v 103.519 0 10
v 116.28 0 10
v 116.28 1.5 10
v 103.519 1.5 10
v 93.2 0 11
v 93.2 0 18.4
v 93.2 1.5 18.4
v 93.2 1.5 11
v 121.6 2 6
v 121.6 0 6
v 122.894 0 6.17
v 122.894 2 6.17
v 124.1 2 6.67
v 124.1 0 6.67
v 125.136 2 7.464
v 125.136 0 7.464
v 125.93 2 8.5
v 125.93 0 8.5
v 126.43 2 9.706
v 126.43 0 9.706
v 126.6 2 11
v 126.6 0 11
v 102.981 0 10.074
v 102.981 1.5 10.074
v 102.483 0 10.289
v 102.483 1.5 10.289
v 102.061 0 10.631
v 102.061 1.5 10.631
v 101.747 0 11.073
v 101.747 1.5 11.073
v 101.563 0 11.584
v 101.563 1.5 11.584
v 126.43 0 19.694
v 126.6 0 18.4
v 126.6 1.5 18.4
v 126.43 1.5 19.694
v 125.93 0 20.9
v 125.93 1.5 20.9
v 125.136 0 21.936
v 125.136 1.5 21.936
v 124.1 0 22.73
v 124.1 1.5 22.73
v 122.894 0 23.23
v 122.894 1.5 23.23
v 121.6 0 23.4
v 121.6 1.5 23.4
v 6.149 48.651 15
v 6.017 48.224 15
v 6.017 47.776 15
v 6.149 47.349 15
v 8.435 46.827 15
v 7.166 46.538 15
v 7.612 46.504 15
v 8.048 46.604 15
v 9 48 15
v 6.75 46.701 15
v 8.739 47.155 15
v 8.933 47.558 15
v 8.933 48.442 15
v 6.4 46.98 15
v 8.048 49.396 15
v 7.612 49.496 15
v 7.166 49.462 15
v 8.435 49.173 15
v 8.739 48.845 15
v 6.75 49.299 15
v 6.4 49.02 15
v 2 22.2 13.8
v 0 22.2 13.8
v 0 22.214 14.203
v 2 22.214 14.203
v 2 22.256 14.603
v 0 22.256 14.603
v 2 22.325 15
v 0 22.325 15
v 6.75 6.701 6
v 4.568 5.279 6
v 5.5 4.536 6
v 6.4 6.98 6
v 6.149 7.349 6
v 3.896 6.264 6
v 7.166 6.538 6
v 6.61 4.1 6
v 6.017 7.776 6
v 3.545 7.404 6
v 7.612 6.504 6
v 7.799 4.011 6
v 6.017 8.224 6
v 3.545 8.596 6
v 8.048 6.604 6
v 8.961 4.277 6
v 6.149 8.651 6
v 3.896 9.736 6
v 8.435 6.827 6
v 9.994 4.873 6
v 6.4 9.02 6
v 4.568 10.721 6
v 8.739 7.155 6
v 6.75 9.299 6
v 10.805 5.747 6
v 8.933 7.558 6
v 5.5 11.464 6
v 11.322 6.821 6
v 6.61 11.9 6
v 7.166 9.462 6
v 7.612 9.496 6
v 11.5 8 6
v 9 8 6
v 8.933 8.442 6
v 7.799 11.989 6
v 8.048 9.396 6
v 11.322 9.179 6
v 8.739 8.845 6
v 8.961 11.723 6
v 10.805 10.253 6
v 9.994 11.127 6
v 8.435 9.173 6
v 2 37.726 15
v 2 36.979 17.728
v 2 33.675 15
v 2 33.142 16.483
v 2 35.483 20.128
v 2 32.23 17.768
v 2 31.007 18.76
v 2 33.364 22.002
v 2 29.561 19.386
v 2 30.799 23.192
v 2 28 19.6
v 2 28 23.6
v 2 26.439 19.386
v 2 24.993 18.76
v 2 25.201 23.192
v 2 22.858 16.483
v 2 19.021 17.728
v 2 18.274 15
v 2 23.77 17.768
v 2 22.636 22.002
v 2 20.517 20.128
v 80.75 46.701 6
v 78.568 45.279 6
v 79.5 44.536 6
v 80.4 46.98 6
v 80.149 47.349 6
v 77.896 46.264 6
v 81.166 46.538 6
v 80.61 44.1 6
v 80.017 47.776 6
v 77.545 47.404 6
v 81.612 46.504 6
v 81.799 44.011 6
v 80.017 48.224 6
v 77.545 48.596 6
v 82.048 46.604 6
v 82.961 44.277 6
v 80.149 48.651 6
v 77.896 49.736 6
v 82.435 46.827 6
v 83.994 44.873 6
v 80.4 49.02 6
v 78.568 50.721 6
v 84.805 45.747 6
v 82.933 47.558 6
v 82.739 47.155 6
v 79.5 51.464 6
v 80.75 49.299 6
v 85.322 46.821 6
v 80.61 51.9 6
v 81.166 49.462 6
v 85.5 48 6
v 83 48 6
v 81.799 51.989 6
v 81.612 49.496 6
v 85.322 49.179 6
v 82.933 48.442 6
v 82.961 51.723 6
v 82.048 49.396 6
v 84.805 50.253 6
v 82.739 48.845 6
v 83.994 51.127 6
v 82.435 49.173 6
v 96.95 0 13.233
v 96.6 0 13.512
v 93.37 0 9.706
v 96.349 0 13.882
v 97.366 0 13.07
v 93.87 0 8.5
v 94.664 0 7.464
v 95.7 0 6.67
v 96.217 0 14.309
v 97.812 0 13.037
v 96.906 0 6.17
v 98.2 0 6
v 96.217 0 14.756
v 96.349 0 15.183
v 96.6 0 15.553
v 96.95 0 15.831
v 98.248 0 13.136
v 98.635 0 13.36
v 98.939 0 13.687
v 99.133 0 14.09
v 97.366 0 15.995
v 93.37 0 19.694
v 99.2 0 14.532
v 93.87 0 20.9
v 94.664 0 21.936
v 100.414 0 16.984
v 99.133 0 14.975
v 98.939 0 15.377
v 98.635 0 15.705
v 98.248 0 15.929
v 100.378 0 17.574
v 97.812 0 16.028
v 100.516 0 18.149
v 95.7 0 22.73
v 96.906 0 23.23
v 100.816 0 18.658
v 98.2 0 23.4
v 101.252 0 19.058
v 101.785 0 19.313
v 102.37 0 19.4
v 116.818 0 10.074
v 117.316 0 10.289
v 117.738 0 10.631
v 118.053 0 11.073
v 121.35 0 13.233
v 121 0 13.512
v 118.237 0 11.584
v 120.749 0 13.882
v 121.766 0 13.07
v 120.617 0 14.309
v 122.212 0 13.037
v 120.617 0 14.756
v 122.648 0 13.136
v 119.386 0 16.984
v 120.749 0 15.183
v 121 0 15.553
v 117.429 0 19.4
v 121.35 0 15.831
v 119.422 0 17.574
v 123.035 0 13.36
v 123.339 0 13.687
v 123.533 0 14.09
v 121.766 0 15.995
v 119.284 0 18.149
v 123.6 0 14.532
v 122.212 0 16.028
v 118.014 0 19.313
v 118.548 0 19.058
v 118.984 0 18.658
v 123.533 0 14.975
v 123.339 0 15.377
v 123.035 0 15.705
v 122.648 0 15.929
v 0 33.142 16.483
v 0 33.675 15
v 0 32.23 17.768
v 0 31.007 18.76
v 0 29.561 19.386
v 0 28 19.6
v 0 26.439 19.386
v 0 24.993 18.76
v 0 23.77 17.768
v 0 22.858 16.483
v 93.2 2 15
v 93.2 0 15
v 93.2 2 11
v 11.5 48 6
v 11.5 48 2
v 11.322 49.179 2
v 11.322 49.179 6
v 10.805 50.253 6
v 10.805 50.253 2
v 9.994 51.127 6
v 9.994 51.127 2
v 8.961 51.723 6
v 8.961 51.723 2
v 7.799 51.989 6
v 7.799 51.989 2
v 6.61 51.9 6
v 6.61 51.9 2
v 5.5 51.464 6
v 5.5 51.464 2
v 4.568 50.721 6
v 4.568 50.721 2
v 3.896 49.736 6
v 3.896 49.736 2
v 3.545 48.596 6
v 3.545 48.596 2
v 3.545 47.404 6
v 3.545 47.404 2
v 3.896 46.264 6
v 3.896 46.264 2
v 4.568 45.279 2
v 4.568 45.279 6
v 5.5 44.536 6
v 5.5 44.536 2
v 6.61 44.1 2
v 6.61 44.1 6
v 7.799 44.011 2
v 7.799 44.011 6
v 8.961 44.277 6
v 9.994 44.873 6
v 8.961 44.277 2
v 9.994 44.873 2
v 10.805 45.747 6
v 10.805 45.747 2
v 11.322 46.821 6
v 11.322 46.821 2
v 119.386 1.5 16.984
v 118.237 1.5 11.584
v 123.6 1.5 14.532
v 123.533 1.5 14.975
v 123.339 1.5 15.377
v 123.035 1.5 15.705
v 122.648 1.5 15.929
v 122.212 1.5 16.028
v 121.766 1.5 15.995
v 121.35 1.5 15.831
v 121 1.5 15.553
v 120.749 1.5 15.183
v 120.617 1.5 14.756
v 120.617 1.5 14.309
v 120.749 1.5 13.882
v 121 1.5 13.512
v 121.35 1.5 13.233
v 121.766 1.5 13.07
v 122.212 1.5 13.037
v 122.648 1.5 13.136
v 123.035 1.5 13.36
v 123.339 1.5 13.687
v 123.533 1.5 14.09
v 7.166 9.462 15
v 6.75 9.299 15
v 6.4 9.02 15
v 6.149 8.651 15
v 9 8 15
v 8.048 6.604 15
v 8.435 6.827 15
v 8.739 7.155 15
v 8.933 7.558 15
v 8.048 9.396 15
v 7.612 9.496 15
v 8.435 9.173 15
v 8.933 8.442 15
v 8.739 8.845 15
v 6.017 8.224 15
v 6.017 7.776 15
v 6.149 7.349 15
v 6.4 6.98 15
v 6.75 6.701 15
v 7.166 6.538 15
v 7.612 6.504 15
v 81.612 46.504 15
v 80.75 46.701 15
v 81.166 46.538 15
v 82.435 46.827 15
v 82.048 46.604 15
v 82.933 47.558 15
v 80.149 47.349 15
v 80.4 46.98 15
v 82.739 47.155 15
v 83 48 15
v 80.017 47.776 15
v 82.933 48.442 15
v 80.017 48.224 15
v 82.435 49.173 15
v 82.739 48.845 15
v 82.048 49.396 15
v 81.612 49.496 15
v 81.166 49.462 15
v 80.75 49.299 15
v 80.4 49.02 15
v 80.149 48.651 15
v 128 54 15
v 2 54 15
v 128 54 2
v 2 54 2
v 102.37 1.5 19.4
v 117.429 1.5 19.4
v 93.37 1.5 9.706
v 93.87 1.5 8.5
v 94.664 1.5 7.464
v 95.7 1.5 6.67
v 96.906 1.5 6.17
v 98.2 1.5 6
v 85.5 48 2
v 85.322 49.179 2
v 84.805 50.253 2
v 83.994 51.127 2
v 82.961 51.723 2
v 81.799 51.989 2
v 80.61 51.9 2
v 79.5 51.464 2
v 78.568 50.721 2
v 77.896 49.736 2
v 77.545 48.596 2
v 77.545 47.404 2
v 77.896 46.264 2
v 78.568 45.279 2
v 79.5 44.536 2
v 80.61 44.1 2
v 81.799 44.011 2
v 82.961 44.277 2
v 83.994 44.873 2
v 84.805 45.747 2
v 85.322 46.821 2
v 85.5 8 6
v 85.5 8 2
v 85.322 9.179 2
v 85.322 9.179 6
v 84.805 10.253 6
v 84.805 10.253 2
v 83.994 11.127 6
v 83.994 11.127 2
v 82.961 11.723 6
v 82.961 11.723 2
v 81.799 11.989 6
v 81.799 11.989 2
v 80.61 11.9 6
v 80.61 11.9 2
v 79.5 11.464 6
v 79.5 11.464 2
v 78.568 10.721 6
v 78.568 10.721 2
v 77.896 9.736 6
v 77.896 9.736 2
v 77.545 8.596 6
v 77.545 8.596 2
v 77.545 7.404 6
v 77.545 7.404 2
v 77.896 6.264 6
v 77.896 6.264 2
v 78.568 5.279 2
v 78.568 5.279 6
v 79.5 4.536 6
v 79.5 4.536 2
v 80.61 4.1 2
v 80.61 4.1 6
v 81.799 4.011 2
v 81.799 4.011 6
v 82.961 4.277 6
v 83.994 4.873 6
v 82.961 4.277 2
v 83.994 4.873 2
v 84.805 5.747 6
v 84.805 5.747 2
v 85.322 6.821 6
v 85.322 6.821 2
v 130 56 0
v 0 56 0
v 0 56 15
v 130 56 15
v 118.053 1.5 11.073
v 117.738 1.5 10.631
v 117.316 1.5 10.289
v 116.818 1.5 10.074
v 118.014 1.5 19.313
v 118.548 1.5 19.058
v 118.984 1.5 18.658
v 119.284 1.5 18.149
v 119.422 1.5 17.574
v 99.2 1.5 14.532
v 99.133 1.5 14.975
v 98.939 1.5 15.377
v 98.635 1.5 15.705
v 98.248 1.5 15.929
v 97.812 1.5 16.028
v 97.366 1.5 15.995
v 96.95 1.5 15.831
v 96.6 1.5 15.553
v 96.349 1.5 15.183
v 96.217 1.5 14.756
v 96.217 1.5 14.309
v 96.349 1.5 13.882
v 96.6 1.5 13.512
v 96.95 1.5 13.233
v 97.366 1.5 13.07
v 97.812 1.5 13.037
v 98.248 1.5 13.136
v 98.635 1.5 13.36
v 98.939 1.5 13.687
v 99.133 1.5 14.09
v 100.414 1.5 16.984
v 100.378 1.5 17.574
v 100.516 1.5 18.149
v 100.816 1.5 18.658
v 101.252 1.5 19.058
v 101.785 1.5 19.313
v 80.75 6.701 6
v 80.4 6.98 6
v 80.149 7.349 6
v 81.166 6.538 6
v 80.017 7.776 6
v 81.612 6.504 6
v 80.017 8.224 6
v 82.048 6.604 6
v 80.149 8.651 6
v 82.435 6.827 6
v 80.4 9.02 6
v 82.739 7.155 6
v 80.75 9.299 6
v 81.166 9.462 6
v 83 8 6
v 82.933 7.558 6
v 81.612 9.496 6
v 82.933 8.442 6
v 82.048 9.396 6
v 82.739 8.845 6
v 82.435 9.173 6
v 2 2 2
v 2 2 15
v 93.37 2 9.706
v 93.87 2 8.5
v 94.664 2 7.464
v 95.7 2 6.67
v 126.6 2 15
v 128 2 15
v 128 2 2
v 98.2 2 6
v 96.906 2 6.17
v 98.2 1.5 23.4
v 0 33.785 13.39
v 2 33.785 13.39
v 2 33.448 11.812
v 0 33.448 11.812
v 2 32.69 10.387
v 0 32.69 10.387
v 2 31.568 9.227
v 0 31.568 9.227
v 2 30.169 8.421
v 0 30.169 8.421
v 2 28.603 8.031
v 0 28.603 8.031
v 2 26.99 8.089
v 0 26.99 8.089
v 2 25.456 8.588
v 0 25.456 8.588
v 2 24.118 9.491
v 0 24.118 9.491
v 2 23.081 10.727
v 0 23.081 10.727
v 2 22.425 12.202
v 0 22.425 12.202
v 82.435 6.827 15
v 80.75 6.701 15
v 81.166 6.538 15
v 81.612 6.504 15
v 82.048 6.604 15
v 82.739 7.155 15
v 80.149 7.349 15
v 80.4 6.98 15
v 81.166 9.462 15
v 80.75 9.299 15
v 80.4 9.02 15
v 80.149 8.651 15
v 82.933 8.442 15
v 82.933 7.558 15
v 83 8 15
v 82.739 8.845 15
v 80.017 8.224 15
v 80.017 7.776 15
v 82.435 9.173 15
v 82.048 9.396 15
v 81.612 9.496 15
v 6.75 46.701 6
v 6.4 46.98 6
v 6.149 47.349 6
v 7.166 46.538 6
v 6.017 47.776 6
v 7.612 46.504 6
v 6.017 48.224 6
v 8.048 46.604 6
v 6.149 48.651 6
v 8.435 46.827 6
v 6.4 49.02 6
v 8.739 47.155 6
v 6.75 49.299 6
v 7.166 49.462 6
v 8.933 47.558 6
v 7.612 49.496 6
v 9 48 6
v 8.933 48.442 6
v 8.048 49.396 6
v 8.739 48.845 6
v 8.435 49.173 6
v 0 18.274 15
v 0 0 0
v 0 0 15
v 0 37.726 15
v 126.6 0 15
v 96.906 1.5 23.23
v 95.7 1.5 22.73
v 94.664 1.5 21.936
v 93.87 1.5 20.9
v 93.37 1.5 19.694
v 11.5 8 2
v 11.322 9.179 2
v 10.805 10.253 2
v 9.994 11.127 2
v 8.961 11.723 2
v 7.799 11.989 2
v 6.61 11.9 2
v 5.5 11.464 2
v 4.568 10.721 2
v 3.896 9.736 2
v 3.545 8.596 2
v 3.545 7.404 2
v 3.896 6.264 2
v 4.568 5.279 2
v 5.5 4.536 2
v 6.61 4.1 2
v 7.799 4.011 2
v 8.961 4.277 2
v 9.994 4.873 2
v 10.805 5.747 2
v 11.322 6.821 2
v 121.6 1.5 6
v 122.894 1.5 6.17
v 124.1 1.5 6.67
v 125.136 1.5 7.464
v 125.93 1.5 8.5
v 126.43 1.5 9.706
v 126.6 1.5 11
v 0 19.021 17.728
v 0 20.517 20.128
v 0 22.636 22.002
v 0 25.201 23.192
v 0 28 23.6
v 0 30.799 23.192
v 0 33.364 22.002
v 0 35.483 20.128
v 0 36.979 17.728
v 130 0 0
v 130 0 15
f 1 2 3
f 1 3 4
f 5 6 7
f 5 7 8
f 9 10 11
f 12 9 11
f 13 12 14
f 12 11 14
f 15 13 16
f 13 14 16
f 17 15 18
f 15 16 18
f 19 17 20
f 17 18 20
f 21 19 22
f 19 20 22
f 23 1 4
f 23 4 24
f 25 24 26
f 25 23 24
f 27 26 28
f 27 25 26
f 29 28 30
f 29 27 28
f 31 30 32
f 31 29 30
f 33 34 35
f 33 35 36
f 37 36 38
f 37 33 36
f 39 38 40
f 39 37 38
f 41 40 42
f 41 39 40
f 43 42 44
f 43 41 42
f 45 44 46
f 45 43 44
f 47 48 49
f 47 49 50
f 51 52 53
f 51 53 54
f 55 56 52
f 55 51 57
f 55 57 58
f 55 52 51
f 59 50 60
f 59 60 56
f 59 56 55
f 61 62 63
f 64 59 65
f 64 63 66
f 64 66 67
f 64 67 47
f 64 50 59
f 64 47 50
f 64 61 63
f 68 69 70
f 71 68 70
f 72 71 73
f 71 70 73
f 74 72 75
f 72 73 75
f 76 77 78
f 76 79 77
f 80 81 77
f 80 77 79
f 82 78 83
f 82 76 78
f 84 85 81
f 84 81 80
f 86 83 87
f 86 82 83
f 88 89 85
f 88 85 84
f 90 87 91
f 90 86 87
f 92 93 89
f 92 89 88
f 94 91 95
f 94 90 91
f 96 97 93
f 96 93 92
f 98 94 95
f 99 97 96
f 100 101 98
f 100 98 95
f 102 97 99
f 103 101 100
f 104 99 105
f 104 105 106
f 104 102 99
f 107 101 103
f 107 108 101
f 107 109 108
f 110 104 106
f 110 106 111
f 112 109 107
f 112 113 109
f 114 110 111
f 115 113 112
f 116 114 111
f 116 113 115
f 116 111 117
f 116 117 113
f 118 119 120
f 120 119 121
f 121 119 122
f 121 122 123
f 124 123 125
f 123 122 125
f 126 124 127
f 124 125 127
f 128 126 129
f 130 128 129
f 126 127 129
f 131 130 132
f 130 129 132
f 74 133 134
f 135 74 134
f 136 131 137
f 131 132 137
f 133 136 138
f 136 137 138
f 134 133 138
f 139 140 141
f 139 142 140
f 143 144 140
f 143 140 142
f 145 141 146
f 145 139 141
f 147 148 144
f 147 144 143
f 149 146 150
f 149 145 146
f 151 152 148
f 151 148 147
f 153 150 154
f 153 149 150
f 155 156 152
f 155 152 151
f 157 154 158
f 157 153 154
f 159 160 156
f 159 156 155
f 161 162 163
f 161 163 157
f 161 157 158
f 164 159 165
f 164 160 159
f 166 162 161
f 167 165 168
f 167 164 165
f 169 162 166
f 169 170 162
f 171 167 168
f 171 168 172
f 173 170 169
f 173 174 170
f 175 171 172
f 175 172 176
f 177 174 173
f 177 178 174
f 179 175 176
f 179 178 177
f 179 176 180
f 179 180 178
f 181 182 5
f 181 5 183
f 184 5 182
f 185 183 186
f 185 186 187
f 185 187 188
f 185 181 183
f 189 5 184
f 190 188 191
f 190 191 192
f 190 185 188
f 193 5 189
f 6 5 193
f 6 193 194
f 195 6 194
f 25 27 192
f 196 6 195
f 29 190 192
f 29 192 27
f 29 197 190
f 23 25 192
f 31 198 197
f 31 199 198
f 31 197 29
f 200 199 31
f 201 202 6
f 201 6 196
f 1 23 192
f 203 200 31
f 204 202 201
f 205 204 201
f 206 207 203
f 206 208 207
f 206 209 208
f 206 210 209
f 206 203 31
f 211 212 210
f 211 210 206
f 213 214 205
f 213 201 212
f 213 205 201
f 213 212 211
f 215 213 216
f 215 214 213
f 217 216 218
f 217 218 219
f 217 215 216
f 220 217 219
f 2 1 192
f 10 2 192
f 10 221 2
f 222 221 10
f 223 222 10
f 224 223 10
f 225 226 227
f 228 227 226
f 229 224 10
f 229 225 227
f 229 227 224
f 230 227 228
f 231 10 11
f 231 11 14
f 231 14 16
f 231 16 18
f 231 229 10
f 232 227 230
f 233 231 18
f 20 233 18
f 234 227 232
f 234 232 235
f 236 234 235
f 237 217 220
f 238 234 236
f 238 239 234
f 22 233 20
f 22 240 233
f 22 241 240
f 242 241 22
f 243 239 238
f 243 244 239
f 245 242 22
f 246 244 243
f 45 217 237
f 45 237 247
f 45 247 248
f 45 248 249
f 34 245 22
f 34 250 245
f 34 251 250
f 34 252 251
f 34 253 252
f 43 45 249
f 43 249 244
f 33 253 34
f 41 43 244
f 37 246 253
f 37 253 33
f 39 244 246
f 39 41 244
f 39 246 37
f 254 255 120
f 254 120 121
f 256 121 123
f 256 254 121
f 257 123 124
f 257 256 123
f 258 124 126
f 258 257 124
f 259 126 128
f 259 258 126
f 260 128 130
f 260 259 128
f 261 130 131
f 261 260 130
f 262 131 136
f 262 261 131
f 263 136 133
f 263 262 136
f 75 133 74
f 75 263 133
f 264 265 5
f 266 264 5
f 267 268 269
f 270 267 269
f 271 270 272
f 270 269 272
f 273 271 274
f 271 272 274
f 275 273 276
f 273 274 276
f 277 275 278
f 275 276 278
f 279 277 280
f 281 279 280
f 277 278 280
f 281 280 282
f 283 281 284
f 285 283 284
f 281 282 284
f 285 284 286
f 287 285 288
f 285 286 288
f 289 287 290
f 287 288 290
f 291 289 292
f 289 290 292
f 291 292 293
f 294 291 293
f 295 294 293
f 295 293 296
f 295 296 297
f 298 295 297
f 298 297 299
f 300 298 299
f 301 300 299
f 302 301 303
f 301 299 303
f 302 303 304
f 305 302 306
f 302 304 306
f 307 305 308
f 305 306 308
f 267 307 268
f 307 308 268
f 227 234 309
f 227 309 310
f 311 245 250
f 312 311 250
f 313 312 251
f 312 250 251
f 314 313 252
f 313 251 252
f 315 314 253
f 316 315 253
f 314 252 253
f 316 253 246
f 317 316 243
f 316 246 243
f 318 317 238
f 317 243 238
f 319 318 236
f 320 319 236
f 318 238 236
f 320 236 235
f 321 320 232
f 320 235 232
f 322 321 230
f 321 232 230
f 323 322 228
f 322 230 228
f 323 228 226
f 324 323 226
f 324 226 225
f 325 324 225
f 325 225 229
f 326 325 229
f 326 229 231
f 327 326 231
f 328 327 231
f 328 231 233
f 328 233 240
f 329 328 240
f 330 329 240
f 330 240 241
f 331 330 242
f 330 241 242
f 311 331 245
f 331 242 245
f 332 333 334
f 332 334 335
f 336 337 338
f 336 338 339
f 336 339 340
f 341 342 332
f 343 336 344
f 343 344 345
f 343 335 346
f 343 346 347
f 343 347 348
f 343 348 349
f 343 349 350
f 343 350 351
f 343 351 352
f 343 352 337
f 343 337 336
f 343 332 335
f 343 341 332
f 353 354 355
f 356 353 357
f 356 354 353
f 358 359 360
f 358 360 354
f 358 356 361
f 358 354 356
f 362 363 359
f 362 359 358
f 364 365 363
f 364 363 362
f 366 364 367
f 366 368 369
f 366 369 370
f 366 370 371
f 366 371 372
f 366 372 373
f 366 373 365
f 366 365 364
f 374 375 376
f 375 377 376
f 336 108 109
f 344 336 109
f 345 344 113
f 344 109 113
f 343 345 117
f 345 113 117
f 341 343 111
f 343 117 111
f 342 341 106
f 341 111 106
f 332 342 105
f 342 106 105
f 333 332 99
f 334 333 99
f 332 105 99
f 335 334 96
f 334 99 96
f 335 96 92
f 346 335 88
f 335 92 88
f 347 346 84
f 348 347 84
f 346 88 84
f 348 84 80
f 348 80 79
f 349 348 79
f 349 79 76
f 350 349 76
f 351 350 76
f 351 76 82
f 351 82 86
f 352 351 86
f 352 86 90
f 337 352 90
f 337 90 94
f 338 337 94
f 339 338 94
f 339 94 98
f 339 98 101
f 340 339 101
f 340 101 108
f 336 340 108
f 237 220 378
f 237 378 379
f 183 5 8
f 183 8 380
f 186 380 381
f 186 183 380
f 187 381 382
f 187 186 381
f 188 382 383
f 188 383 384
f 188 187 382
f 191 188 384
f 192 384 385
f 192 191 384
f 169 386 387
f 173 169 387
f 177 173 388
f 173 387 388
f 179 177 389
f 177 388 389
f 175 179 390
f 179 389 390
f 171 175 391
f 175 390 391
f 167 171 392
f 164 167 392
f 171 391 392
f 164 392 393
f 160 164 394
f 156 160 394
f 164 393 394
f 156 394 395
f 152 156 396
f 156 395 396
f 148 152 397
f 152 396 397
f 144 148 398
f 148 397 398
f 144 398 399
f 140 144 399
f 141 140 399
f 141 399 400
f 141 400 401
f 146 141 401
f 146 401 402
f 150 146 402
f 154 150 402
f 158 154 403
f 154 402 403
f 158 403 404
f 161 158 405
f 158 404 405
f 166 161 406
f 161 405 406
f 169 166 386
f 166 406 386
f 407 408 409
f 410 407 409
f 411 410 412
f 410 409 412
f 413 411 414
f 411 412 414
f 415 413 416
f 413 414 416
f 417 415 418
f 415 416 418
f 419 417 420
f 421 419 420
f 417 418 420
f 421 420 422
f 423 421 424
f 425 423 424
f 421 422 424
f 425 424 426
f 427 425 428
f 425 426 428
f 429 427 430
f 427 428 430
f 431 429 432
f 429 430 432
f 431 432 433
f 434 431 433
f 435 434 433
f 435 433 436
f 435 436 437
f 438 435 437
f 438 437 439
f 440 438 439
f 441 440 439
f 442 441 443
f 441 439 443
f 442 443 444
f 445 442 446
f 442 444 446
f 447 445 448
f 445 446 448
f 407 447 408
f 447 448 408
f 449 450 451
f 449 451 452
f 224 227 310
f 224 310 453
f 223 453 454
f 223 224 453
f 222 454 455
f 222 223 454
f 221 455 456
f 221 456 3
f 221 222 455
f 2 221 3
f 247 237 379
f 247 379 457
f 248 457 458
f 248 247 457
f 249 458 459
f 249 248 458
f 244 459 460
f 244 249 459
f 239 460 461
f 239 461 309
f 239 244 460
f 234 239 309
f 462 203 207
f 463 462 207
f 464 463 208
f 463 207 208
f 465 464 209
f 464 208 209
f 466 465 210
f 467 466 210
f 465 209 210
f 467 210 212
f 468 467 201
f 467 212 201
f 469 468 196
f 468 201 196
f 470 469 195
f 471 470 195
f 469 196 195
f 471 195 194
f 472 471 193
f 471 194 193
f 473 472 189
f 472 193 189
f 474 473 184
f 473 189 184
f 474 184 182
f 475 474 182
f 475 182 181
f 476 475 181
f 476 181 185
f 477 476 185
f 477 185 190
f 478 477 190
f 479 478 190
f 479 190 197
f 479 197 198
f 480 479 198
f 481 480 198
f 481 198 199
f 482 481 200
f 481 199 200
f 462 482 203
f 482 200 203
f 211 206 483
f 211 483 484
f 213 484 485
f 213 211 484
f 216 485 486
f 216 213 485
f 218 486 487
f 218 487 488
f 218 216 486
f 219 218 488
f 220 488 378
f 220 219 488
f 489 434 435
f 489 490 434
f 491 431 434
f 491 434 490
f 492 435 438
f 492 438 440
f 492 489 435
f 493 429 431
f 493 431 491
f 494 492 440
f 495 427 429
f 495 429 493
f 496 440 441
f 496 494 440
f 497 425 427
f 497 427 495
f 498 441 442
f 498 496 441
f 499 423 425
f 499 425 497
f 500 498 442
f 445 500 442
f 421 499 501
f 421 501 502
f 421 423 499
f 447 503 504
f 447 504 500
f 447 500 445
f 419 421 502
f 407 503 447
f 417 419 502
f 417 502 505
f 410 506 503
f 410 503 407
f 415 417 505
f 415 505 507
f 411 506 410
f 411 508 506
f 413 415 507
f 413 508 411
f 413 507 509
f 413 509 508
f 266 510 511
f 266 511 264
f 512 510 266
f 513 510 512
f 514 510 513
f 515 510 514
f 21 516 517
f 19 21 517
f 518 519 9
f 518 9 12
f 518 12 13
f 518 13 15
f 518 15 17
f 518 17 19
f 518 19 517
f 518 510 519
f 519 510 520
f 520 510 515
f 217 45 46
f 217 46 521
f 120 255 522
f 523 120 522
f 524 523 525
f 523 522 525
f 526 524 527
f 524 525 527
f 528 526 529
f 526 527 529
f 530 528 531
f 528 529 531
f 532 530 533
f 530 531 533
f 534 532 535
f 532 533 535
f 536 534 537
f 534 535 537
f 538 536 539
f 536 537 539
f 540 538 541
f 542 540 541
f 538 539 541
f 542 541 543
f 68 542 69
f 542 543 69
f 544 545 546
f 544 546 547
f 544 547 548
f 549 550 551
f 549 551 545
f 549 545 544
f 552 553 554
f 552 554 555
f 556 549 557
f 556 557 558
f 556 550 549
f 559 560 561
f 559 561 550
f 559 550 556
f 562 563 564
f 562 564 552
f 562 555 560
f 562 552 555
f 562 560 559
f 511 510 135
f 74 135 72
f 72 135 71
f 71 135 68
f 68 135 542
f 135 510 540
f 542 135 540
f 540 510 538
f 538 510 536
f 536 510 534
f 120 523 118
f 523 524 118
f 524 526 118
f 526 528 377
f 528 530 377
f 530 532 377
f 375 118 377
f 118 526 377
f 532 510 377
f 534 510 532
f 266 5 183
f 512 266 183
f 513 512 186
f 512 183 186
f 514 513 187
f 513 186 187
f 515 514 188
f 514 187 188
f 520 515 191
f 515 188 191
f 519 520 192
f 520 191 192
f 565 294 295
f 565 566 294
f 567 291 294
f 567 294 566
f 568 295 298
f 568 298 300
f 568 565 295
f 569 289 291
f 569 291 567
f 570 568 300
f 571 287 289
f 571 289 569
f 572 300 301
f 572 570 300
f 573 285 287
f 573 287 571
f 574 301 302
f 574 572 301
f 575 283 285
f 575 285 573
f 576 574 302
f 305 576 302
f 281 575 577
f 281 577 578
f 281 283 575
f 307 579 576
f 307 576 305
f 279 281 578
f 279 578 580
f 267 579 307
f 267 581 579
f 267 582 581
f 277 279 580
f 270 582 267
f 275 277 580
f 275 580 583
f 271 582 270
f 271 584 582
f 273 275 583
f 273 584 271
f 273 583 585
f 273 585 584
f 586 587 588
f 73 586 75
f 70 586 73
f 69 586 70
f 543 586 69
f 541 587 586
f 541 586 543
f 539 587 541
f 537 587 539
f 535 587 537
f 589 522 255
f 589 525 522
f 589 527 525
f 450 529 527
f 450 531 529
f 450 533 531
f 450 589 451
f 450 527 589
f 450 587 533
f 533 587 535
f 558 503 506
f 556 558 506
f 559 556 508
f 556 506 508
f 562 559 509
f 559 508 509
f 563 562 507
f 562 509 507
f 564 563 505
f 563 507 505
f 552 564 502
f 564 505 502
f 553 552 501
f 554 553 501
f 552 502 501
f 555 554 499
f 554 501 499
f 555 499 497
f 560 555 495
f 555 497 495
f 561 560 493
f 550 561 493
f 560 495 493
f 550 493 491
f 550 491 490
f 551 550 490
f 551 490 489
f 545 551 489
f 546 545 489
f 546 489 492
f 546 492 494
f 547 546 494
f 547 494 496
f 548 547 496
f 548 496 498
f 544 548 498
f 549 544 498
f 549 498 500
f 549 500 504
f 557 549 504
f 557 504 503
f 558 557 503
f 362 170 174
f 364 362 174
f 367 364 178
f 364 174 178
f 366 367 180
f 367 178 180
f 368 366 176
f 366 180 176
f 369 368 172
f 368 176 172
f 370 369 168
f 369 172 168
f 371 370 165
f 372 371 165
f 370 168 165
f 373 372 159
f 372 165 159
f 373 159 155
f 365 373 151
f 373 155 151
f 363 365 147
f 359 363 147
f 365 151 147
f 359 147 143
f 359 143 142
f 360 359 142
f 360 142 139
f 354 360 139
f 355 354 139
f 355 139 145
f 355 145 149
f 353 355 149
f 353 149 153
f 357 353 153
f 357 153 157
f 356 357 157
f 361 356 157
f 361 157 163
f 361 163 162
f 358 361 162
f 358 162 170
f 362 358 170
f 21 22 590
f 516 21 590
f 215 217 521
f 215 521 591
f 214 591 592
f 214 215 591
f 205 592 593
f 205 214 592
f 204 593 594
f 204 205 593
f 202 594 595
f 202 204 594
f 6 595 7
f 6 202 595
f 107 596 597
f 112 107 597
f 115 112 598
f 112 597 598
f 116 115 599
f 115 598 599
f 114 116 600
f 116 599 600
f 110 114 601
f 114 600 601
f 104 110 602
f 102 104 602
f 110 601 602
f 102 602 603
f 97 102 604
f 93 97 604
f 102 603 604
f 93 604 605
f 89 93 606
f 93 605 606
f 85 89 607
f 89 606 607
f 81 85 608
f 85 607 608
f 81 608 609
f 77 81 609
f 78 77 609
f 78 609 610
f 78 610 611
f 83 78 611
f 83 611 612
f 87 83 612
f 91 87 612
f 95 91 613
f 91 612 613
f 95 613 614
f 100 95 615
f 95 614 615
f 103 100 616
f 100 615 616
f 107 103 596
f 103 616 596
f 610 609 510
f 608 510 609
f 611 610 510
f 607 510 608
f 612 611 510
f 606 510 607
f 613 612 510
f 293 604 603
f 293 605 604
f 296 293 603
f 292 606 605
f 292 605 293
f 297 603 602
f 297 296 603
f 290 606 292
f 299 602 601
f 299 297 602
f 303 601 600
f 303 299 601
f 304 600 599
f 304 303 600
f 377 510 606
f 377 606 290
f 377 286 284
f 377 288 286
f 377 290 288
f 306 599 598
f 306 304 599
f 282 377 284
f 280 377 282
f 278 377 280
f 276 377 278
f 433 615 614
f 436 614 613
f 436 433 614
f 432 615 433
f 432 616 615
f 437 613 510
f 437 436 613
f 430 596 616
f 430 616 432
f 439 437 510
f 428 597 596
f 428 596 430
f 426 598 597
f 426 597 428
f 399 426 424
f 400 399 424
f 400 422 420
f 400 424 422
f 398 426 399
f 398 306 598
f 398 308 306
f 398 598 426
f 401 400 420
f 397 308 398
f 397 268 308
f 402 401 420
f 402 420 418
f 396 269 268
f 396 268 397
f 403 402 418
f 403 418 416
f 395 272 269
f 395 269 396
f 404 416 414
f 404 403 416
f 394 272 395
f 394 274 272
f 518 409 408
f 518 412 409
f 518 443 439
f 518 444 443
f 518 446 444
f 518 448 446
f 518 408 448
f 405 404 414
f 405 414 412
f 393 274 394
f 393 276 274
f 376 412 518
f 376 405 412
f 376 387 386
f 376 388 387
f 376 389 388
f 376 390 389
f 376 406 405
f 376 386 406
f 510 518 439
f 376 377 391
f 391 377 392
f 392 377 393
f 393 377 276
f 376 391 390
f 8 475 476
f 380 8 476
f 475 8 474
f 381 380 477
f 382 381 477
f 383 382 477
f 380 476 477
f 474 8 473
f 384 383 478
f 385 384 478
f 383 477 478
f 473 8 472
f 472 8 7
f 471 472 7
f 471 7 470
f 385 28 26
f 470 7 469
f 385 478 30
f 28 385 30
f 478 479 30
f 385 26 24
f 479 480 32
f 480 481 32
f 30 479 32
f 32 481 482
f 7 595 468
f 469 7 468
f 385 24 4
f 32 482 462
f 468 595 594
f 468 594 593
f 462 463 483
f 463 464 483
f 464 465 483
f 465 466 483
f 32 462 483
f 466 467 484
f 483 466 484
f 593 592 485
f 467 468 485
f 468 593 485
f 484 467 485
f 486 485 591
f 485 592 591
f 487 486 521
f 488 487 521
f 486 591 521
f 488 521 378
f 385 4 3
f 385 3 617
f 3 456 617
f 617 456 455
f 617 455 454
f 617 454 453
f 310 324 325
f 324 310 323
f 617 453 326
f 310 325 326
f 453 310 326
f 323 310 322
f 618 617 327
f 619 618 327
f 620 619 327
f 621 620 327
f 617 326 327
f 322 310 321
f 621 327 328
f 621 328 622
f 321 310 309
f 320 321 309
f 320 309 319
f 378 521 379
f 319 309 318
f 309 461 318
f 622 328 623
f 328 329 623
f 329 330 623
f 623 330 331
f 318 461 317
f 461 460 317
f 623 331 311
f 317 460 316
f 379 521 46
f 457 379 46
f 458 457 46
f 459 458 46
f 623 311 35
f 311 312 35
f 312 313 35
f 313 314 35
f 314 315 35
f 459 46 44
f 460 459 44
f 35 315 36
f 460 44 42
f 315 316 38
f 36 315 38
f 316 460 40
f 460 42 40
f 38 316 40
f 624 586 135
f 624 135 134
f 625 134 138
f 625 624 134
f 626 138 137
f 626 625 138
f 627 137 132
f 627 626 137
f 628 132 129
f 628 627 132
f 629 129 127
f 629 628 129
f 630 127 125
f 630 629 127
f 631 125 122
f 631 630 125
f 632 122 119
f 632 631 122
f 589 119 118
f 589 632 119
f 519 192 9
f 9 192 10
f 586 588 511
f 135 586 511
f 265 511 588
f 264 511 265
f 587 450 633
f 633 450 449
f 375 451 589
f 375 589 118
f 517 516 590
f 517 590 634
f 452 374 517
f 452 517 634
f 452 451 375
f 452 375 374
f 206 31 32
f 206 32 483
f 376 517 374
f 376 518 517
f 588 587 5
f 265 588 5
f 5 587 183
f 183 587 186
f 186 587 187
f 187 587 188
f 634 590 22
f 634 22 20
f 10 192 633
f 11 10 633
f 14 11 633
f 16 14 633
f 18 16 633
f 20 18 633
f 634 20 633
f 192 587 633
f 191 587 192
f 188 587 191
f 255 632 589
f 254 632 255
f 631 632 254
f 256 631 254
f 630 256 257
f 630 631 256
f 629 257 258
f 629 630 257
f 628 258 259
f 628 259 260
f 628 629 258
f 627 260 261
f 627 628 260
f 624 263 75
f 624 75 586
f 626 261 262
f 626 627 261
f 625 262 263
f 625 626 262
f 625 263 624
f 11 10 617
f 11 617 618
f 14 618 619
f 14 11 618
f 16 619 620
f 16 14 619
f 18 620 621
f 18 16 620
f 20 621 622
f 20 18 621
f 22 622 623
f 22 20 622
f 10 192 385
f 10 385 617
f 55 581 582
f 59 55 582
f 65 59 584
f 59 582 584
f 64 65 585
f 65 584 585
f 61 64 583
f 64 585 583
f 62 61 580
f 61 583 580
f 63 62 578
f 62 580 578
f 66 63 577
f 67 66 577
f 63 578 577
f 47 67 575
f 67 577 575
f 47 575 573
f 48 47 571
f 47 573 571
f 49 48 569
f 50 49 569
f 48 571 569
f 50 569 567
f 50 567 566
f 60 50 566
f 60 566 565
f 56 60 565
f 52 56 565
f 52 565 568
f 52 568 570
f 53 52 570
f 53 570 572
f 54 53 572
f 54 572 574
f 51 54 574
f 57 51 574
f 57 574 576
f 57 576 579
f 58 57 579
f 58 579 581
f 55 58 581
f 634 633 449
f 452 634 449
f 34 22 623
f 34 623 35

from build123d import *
from build123d import SkipClean  # not in build123d's __all__

# Parameters (mm, degrees)
F0_W      = 130
F0_H      = 56
F1_DEPTH  = 15
F2_T      = -2
F3_R      = 1.5
F4_DEPTH  = 13
F5_R      = 4
F6_DEPTH  = 4
F9_DEPTH  = 5
F7_R      = 1.5
F10_DEPTH = 1.5
F12_DEPTH = 25
F14_DEPTH = 2


with BuildPart() as f1:
    # F0 (on Top) → F1 (new body)
    with BuildSketch(Plane.XY):
        with Locations((65, 28)):
            Rectangle(F0_W, F0_H)
    extrude(amount=F1_DEPTH)

    # F2
    f2_openings = [f1.faces().sort_by_distance(p)[0] for p in [
        (65, 28, 15),
    ]]
    offset(amount=F2_T, openings=f2_openings)

    # F3 (on face) → F4 (join)
    with BuildSketch(Plane.XY.offset(2)):
        with Locations((81.5, 48)):
            Circle(F3_R)
        with Locations((81.5, 8)):
            Circle(F3_R)
        with Locations((7.5, 8)):
            Circle(F3_R)
        with Locations((7.5, 48)):
            Circle(F3_R)
    extrude(amount=F4_DEPTH)

    # F5 (on face) → F6 (join)
    with BuildSketch(Plane.XY.offset(2)):
        with Locations((81.5, 48)):
            Circle(F5_R)
        with Locations((81.5, 8)):
            Circle(F5_R)
        with Locations((7.5, 48)):
            Circle(F5_R)
        with Locations((7.5, 8)):
            Circle(F5_R)
    extrude(amount=F6_DEPTH)

    # F8 (on face) → F9 (cut)
    with BuildSketch(Plane.XZ):
        with BuildLine():
            Line((126.6, 23.4), (93.2, 23.4))
            Line((93.2, 23.4), (93.2, 11))
            ThreePointArc((93.2, 11), (94.6644660941, 7.4644660941), (98.2, 6))
            Line((98.2, 6), (121.6, 6))
            ThreePointArc((121.6, 6), (125.1355339059, 7.4644660941), (126.6, 11))
            Line((126.6, 11), (126.6, 23.4))
        make_face()
    extrude(amount=-F9_DEPTH, mode=Mode.SUBTRACT)

    # F11 (on face) → F12 (cut)
    with BuildSketch(Plane(origin=(0, 0, 0), x_dir=(0, -1, 0), z_dir=(-1, 0, 0))):
        with BuildLine():
            ThreePointArc((-33.6745043836, 15), (-28.6032721504, 8.0314592216), (-22.2, 13.8))
            ThreePointArc((-22.2, 13.8), (-22.2314592216, 14.4032721504), (-22.3254956164, 15))
            Line((-22.3254956164, 15), (-33.6745043836, 15))
        make_face()
    extrude(amount=-F12_DEPTH, mode=Mode.SUBTRACT)

    # F13 (on face) → F14 (join)
    with BuildSketch(Plane(origin=(0, 0, 0), x_dir=(0, -1, 0), z_dir=(-1, 0, 0))):
        with BuildLine():
            ThreePointArc((-33.6745043836, 15), (-28, 19.6), (-22.3254956164, 15))
            Line((-22.3254956164, 15), (-18.2737468674, 15))
            ThreePointArc((-18.2737468674, 15), (-28, 23.6), (-37.7262531326, 15))
            Line((-37.7262531326, 15), (-33.6745043836, 15))
        make_face()
    with SkipClean():  # cleaning this boolean's faces spoils the solid; the shape is the same uncleaned
        extrude(amount=-F14_DEPTH)


with BuildPart() as f10:
    # F7 (on face) → F10 (new body)
    with BuildSketch(Plane.XZ):
        with BuildLine():
            Line((121.6, 23.4), (98.2, 23.4))
            ThreePointArc((98.2, 23.4), (94.6644660941, 21.9355339059), (93.2, 18.4))
            Line((93.2, 18.4), (93.2, 11))
            ThreePointArc((93.2, 11), (94.6644660941, 7.4644660941), (98.2, 6))
            Line((98.2, 6), (121.6, 6))
            ThreePointArc((121.6, 6), (125.1355339059, 7.4644660941), (126.6, 11))
            Line((126.6, 11), (126.6, 18.4))
            ThreePointArc((126.6, 18.4), (125.1355339059, 21.9355339059), (121.6, 23.4))
        make_face()
        with Locations((97.7, 14.5323744416)):
            Circle(F7_R, mode=Mode.SUBTRACT)
        with Locations((122.1, 14.5323744416)):
            Circle(F7_R, mode=Mode.SUBTRACT)
        with BuildLine():
            ThreePointArc((100.413788142, 16.9837847111), (100.8155820096, 18.6584850858), (102.37, 19.4))
            Line((102.37, 19.4), (117.4293995654, 19.4))
            ThreePointArc((117.4293995654, 19.4), (118.9838175558, 18.6584850858), (119.3856114233, 16.9837847111))
            Line((119.3856114233, 16.9837847111), (118.2366752531, 11.5837847111))
            ThreePointArc((118.2366752531, 11.5837847111), (117.5389484809, 10.4455820096), (116.2804633952, 10))
            Line((116.2804633952, 10), (103.5189361702, 10))
            ThreePointArc((103.5189361702, 10), (102.2604510845, 10.4455820096), (101.5627243122, 11.5837847111))
            Line((101.5627243122, 11.5837847111), (100.413788142, 16.9837847111))
        make_face(mode=Mode.SUBTRACT)
    extrude(amount=-F10_DEPTH)


solid = Compound([f1.part, f10.part])
